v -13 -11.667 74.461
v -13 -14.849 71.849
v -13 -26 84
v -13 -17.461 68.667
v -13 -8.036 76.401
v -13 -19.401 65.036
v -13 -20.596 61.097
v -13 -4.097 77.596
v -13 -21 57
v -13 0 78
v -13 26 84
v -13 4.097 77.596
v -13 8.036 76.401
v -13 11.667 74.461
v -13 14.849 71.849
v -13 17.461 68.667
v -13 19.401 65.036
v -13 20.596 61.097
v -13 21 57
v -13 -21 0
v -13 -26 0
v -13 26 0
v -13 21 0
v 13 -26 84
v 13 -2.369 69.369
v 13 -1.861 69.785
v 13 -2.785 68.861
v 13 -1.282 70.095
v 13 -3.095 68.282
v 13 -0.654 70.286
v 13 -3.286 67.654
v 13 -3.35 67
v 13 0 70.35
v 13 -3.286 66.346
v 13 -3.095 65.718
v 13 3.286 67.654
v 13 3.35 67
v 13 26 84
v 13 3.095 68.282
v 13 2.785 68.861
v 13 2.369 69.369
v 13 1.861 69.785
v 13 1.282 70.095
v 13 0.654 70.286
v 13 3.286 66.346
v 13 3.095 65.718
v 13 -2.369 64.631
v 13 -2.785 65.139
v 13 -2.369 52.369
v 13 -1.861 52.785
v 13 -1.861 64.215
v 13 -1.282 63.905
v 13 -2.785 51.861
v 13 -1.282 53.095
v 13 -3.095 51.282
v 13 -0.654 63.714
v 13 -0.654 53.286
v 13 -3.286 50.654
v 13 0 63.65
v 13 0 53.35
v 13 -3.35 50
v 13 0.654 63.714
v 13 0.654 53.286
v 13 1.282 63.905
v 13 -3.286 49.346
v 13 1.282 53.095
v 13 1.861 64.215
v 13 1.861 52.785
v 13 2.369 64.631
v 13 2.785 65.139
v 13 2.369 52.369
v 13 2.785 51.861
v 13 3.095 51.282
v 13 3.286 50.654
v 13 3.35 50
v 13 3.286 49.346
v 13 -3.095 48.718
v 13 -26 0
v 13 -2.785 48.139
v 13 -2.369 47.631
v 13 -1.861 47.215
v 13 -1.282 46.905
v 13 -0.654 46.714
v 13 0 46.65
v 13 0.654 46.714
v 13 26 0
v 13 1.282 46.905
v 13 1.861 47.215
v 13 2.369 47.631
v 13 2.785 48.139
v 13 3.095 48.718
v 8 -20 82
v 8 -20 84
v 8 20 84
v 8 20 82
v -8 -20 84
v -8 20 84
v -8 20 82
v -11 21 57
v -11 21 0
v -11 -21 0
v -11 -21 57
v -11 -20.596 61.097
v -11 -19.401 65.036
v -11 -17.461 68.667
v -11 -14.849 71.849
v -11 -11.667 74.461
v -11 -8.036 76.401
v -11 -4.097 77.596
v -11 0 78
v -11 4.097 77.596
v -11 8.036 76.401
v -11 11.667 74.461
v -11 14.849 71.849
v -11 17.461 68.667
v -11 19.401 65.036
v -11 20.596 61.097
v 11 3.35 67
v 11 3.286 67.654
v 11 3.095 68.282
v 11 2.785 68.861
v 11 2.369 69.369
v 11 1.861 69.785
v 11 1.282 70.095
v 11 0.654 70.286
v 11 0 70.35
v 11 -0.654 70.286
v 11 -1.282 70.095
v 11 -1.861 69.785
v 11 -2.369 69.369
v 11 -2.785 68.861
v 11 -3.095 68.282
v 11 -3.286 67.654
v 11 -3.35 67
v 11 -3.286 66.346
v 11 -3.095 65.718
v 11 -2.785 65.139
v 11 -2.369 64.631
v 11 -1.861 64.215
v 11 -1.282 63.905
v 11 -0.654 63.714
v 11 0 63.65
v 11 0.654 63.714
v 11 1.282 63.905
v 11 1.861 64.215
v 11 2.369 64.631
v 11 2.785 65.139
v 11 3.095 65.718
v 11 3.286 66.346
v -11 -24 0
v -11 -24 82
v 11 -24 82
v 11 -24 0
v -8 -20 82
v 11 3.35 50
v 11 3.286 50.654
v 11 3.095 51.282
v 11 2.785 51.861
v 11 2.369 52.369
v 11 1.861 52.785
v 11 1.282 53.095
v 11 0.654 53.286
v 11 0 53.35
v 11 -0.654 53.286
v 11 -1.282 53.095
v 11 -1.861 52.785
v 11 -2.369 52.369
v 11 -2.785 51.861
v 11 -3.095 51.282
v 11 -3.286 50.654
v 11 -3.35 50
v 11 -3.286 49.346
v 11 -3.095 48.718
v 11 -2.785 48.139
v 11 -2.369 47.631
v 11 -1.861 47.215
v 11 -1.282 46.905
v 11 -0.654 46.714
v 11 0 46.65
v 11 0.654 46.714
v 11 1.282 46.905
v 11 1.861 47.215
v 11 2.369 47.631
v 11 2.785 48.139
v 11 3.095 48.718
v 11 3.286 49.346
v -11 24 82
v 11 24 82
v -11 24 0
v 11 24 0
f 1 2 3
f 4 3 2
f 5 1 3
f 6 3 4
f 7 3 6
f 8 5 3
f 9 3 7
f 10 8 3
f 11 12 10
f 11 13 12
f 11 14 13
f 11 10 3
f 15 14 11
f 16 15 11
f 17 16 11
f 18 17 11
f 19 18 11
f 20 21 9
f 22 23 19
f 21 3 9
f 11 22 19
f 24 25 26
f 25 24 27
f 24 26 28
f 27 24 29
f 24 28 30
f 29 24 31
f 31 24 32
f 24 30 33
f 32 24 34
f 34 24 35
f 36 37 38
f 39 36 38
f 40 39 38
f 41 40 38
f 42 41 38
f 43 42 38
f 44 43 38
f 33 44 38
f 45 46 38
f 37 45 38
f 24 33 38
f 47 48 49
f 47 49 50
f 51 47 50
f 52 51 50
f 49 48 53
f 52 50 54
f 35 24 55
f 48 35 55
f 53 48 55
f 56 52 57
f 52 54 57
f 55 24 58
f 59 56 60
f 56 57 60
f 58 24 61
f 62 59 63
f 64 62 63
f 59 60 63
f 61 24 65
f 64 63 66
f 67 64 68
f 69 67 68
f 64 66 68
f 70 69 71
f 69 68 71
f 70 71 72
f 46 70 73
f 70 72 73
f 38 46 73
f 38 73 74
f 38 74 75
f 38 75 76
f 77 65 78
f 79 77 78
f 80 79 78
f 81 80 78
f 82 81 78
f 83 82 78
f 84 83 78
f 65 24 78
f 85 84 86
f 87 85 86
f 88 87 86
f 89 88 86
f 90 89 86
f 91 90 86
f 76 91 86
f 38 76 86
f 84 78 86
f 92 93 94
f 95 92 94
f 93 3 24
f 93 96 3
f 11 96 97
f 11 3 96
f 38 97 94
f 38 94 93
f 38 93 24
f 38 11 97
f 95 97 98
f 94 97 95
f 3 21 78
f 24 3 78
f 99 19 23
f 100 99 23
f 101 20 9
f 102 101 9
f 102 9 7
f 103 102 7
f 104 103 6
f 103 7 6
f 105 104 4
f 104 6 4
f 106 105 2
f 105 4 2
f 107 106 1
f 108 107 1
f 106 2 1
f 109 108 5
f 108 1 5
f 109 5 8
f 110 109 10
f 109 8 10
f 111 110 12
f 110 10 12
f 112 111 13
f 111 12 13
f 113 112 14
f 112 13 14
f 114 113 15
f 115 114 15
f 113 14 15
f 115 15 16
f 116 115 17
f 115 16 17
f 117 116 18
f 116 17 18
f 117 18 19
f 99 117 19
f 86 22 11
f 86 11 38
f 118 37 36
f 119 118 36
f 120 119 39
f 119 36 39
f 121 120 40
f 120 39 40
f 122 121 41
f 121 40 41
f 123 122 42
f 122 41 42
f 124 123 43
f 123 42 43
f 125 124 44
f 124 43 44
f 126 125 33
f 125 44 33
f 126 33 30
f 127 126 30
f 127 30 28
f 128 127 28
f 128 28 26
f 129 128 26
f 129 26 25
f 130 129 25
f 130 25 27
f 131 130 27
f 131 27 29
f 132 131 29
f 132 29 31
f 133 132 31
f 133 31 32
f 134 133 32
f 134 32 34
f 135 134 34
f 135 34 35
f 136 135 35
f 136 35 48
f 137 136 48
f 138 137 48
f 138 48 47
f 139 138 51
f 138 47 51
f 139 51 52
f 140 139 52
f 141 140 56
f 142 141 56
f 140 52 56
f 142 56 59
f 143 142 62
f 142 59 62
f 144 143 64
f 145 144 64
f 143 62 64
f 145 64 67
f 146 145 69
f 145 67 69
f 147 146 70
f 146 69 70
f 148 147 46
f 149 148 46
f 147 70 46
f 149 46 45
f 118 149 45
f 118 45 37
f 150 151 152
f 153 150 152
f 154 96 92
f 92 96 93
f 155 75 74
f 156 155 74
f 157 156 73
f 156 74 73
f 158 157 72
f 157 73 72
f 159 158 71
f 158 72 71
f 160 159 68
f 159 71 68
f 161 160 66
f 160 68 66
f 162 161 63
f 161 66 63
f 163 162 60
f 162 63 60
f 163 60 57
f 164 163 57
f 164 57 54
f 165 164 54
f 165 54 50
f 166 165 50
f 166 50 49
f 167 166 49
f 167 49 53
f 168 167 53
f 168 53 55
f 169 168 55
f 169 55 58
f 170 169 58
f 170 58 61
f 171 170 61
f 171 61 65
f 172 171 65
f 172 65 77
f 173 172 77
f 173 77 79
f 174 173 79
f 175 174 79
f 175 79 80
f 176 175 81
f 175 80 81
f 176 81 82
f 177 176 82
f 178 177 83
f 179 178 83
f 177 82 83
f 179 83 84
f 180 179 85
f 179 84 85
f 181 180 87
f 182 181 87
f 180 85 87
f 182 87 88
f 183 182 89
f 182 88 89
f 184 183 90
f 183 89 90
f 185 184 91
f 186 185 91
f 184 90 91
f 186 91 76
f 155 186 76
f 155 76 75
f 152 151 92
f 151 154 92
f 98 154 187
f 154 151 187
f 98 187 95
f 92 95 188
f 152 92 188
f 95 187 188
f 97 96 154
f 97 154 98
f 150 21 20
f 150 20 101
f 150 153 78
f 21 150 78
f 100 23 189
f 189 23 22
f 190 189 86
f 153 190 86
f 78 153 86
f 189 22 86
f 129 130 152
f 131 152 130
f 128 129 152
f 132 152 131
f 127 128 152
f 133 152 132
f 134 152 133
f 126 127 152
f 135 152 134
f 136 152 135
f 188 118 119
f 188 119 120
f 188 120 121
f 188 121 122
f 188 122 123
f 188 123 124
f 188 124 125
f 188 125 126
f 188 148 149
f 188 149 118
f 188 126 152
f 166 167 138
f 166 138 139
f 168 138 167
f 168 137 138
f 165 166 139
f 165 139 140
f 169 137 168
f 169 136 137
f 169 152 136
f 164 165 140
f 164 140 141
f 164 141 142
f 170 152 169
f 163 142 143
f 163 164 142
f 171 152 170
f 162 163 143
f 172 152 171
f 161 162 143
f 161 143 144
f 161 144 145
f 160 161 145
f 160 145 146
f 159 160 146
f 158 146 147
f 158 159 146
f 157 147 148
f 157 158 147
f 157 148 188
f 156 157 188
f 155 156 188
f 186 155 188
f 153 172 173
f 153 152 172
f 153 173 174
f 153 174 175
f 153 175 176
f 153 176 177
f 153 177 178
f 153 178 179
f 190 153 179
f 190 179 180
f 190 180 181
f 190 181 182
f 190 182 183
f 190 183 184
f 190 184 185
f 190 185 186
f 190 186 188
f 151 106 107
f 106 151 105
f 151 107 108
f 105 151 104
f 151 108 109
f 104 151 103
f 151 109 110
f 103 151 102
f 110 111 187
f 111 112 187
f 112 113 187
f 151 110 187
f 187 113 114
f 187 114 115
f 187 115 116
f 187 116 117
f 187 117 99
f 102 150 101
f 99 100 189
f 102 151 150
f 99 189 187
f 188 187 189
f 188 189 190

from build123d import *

# Parameters (mm, degrees)
F0_W      = 26
F0_H      = 52
F1_DEPTH  = 84
F2_T      = -2
F4_DEPTH  = 3
F5_R      = 3.35
F6_DEPTH  = 3
F7_W      = 13
F7_H      = 13
F8_DEPTH  = 3
F9_W      = 16
F9_H      = 40
F10_DEPTH = 25


with BuildPart() as f1:
    # F0 (on Top) → F1 (new body)
    with BuildSketch(Plane.XY):
        Rectangle(F0_W, F0_H)
    extrude(amount=F1_DEPTH)

    # F2
    f2_openings = [f1.faces().sort_by_distance(p)[0] for p in [
        (0, 0, 0),
    ]]
    offset(amount=F2_T, openings=f2_openings)

    # F3 (on face) → F4 (cut)
    with BuildSketch(Plane(origin=(-13, 0, 0), x_dir=(0, -1, 0), z_dir=(-1, 0, 0))):
        with BuildLine():
            ThreePointArc((-21, 57), (0, 36), (21, 57))
            ThreePointArc((21, 57), (0, 78), (-21, 57))
        make_face()
        with BuildLine():
            Line((21, 0), (21, 57))
            ThreePointArc((21, 57), (0, 36), (-21, 57))
            Line((-21, 57), (-21, 0))
            Line((-21, 0), (21, 0))
        make_face()
    extrude(amount=-F4_DEPTH, mode=Mode.SUBTRACT)

    # F5 (on face) → F6 (cut)
    with BuildSketch(Plane.YZ.offset(13)):
        with Locations((0, 67)):
            Circle(F5_R)
        with Locations((0, 50)):
            Circle(F5_R)
    extrude(amount=-F6_DEPTH, mode=Mode.SUBTRACT)

    # F7 (on face) → F8 (cut)
    with BuildSketch(Plane(origin=(-13, 0, 0), x_dir=(0, -1, 0), z_dir=(-1, 0, 0))):
        with Locations((0, 67)):
            Rectangle(F7_W, F7_H)
        with Locations((0, 50)):
            Rectangle(F7_W, F7_H)
    extrude(amount=-F8_DEPTH, mode=Mode.SUBTRACT)

    # F9 (on face) → F10 (cut)
    with BuildSketch(Plane.XY.offset(84)):
        Rectangle(F9_W, F9_H)
    extrude(amount=-F10_DEPTH, mode=Mode.SUBTRACT)


solid = f1.part
